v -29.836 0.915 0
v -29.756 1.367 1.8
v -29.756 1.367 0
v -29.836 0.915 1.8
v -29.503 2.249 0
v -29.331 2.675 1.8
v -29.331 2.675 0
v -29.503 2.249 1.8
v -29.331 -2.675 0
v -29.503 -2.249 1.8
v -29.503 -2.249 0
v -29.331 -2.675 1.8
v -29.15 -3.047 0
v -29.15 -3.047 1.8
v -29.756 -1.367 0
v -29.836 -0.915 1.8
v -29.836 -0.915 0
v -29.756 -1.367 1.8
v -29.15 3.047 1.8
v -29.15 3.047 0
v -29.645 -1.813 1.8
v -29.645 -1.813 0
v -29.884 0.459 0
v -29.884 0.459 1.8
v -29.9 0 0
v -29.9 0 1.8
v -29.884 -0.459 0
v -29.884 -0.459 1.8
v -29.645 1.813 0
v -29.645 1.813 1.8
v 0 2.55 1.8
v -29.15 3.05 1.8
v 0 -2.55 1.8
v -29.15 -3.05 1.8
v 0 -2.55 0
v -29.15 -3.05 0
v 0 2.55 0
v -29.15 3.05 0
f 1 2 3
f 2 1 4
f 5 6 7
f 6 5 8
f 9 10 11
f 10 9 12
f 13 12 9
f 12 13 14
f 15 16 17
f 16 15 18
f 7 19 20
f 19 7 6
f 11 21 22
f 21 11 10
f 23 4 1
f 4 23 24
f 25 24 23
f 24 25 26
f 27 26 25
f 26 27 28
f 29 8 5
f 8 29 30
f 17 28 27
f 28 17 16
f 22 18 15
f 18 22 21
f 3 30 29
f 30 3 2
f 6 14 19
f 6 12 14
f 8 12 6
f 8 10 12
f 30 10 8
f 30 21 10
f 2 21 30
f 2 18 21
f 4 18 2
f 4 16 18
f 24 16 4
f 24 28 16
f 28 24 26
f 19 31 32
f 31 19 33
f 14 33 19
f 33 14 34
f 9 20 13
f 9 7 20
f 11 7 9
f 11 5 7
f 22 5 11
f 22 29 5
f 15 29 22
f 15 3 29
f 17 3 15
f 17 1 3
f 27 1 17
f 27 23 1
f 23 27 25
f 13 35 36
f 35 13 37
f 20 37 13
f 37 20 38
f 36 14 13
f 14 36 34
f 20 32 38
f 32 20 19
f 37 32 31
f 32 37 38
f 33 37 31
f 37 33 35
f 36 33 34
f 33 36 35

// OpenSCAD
//
//  **************************************************************
//  * Sole(Semelle) du Chassis  Canon de 36 livres modèle 1780   *
//  **************************************************************
//
// DE36_SOL_V1.scad
//
// Michel RIVIERE 2018 03 14
// V1

include <DE36_REF_V1.scad>;


module SOL(PR3D_Flag=0){

//  SOL_BAS donnée de la base de la sole (parallépipède)
//

BaseSolePoints= [
[-SOL_BAS_LON,-SOL_BAS_GrandeLargeur/2,0],        // 0 
[-SOL_BAS_LON,SOL_BAS_GrandeLargeur/2,0],         // 1 
[0,SOL_BAS_PetiteLargeur/2,0],                    // 2 
[0,-SOL_BAS_PetiteLargeur/2,0],                   // 3 
[-SOL_BAS_LON,-SOL_BAS_GrandeLargeur/2,SOL_HAU],  // 4 
[-SOL_BAS_LON,SOL_BAS_GrandeLargeur/2,SOL_HAU],   // 5 
[0,SOL_BAS_PetiteLargeur/2,SOL_HAU],              // 6 
[0,-SOL_BAS_PetiteLargeur/2,SOL_HAU]];            // 7 

BaseSoleFaces= [
[0,1,2,3],    // bottom
[4,5,1,0],    // front
[7,6,5,4],    // top
[5,6,2,1],    // right
[6,7,3,2],    // back
[7,4,0,3]];   // left
    
    

render() //mode rendering est necessaire pour éviter la visu d'un mesh du disque complet
union () {
// SOL_BAS Generation de la base de la Sole
//
    polyhedron( BaseSolePoints, BaseSoleFaces );
 
// SOL_ARC Generation de l'arc de queue de la Sole : disque tronqué par un cube
//
    difference(){
        translate(v=[-SOL_BAS_LON+SOL_ARC_Rayon-SOL_ARC_Pied,0,0])
        cylinder(h=SOL_HAU,r1=SOL_ARC_Rayon,r2=SOL_ARC_Rayon,$fn=Fn_sphere);
        
        translate(v=[-SOL_BAS_LON+SOL_ARC_Rayon,0,SOL_HAU/2])
        cube([2*SOL_ARC_Rayon,2*SOL_ARC_Rayon,SOL_HAU],center=true);
}
}
}
/*Demo*/
SOL(1);
